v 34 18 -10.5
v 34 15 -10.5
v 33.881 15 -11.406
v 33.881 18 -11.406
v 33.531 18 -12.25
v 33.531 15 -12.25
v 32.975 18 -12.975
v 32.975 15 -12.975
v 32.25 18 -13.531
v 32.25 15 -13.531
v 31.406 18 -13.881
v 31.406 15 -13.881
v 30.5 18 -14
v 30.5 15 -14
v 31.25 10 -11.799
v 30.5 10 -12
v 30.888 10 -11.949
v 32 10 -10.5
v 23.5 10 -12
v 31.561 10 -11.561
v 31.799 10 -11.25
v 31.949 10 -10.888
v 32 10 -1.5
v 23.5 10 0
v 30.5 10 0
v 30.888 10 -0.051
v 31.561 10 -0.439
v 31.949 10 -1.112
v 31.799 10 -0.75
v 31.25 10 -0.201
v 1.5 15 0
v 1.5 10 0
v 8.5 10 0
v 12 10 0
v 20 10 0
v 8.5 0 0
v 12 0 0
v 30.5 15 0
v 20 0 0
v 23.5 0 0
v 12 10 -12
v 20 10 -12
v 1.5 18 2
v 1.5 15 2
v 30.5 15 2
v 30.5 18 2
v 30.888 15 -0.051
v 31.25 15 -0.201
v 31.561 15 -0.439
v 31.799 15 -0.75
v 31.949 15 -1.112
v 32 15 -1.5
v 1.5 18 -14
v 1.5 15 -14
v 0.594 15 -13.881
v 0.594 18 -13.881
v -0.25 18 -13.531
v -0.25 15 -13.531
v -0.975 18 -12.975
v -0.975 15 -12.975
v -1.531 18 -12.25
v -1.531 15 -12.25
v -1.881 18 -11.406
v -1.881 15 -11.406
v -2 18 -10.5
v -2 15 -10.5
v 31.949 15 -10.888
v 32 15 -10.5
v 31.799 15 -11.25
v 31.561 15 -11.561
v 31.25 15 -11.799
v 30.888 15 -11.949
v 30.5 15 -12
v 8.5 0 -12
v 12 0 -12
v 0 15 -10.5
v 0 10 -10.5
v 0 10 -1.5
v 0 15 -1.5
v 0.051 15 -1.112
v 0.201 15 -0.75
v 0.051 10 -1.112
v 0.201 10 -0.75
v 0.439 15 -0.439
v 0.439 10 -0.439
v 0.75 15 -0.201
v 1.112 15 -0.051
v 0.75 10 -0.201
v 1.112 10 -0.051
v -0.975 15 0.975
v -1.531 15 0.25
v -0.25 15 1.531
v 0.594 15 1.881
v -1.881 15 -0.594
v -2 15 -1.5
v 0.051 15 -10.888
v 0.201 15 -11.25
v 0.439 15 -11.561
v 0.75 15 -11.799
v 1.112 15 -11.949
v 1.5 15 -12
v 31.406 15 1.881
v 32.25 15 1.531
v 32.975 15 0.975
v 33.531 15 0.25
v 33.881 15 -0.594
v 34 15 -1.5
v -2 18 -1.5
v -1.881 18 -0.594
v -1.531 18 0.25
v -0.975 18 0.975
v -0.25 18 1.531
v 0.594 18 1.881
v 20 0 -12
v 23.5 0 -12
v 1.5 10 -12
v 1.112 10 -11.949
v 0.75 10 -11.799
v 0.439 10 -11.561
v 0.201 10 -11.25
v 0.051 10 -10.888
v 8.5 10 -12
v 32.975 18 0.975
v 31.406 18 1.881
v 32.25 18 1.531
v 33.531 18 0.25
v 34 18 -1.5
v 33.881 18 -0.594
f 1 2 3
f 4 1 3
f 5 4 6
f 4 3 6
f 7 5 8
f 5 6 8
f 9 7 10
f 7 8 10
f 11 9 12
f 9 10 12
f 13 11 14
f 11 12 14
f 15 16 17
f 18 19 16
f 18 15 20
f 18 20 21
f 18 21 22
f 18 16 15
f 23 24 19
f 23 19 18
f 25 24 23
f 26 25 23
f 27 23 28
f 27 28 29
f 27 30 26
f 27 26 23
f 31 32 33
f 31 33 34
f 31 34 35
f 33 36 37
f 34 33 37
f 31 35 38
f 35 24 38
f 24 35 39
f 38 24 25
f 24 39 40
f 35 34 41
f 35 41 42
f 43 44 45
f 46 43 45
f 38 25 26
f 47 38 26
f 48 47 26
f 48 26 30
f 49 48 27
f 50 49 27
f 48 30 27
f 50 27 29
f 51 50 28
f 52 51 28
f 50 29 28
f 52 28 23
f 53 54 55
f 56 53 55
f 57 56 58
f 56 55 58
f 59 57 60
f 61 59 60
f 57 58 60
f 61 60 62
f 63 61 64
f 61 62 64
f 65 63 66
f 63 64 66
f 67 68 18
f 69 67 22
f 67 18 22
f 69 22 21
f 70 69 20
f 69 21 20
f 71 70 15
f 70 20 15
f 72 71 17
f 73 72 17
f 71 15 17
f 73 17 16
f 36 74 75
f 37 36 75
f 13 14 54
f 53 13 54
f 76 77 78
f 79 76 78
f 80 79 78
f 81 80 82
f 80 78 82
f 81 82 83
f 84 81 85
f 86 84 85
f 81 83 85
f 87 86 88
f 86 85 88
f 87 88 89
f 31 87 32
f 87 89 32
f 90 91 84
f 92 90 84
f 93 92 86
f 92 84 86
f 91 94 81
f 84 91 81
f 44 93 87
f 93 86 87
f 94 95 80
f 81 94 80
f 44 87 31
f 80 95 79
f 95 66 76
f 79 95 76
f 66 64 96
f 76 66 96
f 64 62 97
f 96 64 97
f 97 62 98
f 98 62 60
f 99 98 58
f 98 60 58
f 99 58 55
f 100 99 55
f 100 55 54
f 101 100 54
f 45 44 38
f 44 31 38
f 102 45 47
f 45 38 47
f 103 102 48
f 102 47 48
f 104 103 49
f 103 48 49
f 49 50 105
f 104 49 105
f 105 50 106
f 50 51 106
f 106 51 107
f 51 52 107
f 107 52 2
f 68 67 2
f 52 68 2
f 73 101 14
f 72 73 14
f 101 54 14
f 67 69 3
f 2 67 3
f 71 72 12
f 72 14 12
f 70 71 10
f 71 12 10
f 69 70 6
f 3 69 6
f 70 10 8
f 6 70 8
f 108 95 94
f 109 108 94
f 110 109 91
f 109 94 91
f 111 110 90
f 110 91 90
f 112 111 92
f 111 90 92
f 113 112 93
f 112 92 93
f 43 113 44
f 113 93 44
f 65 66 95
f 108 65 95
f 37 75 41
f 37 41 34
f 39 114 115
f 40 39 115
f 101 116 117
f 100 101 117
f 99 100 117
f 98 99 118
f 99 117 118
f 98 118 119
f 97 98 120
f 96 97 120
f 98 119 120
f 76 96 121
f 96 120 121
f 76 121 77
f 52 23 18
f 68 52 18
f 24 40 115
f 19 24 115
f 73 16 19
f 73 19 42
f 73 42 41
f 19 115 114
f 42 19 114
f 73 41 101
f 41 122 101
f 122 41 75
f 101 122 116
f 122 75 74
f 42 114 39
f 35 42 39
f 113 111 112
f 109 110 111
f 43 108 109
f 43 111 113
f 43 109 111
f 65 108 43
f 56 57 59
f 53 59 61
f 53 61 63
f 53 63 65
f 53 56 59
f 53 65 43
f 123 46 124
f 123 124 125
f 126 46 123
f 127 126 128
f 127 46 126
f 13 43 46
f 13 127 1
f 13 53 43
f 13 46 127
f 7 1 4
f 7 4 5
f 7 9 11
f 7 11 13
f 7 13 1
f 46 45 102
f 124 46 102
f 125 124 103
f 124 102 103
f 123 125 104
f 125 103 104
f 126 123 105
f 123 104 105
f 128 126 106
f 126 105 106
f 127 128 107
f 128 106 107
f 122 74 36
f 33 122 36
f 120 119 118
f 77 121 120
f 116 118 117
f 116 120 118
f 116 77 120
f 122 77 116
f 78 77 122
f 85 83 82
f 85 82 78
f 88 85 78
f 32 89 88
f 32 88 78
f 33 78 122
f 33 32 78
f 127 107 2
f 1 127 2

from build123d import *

# Parameters (mm, degrees)
BOSS_EXTRUDE1_DEPTH = 15
BOSS_EXTRUDE2_DEPTH = 3
SKETCH3_W           = 8
SKETCH3_H           = 12
CUT_EXTRUDE1_DEPTH  = 10
CUT_EXTRUDE3_DEPTH  = 10


with BuildPart() as part:
    # Sketch1 → Boss-Extrude1 (new body)
    with BuildSketch(Plane(origin=(0, 0, 0), x_dir=(1, 0, 0), z_dir=(0, 1, 0))):
        with BuildLine():
            Line((1.5, 0), (30.5, 0))
            ThreePointArc((30.5, 0), (31.560660172, 0.439339828), (32, 1.5))
            Line((32, 1.5), (32, 10.5))
            ThreePointArc((32, 10.5), (31.560660172, 11.560660172), (30.5, 12))
            Line((30.5, 12), (1.5, 12))
            ThreePointArc((1.5, 12), (0.439339828, 11.560660172), (0, 10.5))
            Line((0, 10.5), (0, 1.5))
            ThreePointArc((0, 1.5), (0.439339828, 0.439339828), (1.5, 0))
        make_face()
    extrude(amount=BOSS_EXTRUDE1_DEPTH)

    # Sketch2 → Boss-Extrude2 (add)
    with BuildSketch(Plane(origin=(0, 15, 0), x_dir=(1, 0, 0), z_dir=(0, 1, 0))):
        with BuildLine():
            Line((1.5, -2), (30.5, -2))
            ThreePointArc((30.5, -2), (32.974873734, -0.974873734), (34, 1.5))
            Line((34, 1.5), (34, 10.5))
            ThreePointArc((34, 10.5), (32.974873734, 12.974873734), (30.5, 14))
            Line((30.5, 14), (1.5, 14))
            ThreePointArc((1.5, 14), (-0.974873734, 12.974873734), (-2, 10.5))
            Line((-2, 10.5), (-2, 1.5))
            ThreePointArc((-2, 1.5), (-0.974873734, -0.974873734), (1.5, -2))
        make_face()
        with BuildLine():
            ThreePointArc((32, 10.5), (31.560660172, 11.560660172), (30.5, 12))
            Line((30.5, 12), (1.5, 12))
            ThreePointArc((1.5, 12), (0.439339828, 11.560660172), (0, 10.5))
            Line((0, 10.5), (0, 1.5))
            ThreePointArc((0, 1.5), (0.439339828, 0.439339828), (1.5, 0))
            Line((1.5, 0), (30.5, 0))
            ThreePointArc((30.5, 0), (31.560660172, 0.439339828), (32, 1.5))
            Line((32, 1.5), (32, 10.5))
        make_face(mode=Mode.SUBTRACT)
        with BuildLine():
            Line((32, 1.5), (32, 10.5))
            ThreePointArc((32, 10.5), (31.560660172, 11.560660172), (30.5, 12))
            Line((30.5, 12), (1.5, 12))
            ThreePointArc((1.5, 12), (0.439339828, 11.560660172), (0, 10.5))
            Line((0, 10.5), (0, 1.5))
            ThreePointArc((0, 1.5), (0.439339828, 0.439339828), (1.5, 0))
            Line((1.5, 0), (30.5, 0))
            ThreePointArc((30.5, 0), (31.560660172, 0.439339828), (32, 1.5))
        make_face()
    extrude(amount=BOSS_EXTRUDE2_DEPTH)

    # Sketch3 → Cut-Extrude1 (cut)
    with BuildSketch(Plane.XZ):
        with Locations((16, -6)):
            Rectangle(SKETCH3_W, SKETCH3_H)
    extrude(amount=-CUT_EXTRUDE1_DEPTH, mode=Mode.SUBTRACT)

    # Sketch4 → Cut-Extrude3 (cut)
    with BuildSketch(Plane.XZ):
        with BuildLine():
            Line((8.5, 0), (1.5, 0))
            ThreePointArc((1.5, 0), (0.439339828, -0.439339828), (0, -1.5))
            Line((0, -1.5), (0, -10.5))
            ThreePointArc((0, -10.5), (0.439339828, -11.560660172), (1.5, -12))
            Line((1.5, -12), (8.5, -12))
            Line((8.5, -12), (8.5, 0))
        make_face()
        with BuildLine():
            Line((23.5, -12), (30.5, -12))
            ThreePointArc((30.5, -12), (31.560660172, -11.560660172), (32, -10.5))
            Line((32, -10.5), (32, -1.5))
            ThreePointArc((32, -1.5), (31.560660172, -0.439339828), (30.5, 0))
            Line((30.5, 0), (23.5, 0))
            Line((23.5, 0), (23.5, -12))
        make_face()
    extrude(amount=-CUT_EXTRUDE3_DEPTH, mode=Mode.SUBTRACT)


solid = part.part
